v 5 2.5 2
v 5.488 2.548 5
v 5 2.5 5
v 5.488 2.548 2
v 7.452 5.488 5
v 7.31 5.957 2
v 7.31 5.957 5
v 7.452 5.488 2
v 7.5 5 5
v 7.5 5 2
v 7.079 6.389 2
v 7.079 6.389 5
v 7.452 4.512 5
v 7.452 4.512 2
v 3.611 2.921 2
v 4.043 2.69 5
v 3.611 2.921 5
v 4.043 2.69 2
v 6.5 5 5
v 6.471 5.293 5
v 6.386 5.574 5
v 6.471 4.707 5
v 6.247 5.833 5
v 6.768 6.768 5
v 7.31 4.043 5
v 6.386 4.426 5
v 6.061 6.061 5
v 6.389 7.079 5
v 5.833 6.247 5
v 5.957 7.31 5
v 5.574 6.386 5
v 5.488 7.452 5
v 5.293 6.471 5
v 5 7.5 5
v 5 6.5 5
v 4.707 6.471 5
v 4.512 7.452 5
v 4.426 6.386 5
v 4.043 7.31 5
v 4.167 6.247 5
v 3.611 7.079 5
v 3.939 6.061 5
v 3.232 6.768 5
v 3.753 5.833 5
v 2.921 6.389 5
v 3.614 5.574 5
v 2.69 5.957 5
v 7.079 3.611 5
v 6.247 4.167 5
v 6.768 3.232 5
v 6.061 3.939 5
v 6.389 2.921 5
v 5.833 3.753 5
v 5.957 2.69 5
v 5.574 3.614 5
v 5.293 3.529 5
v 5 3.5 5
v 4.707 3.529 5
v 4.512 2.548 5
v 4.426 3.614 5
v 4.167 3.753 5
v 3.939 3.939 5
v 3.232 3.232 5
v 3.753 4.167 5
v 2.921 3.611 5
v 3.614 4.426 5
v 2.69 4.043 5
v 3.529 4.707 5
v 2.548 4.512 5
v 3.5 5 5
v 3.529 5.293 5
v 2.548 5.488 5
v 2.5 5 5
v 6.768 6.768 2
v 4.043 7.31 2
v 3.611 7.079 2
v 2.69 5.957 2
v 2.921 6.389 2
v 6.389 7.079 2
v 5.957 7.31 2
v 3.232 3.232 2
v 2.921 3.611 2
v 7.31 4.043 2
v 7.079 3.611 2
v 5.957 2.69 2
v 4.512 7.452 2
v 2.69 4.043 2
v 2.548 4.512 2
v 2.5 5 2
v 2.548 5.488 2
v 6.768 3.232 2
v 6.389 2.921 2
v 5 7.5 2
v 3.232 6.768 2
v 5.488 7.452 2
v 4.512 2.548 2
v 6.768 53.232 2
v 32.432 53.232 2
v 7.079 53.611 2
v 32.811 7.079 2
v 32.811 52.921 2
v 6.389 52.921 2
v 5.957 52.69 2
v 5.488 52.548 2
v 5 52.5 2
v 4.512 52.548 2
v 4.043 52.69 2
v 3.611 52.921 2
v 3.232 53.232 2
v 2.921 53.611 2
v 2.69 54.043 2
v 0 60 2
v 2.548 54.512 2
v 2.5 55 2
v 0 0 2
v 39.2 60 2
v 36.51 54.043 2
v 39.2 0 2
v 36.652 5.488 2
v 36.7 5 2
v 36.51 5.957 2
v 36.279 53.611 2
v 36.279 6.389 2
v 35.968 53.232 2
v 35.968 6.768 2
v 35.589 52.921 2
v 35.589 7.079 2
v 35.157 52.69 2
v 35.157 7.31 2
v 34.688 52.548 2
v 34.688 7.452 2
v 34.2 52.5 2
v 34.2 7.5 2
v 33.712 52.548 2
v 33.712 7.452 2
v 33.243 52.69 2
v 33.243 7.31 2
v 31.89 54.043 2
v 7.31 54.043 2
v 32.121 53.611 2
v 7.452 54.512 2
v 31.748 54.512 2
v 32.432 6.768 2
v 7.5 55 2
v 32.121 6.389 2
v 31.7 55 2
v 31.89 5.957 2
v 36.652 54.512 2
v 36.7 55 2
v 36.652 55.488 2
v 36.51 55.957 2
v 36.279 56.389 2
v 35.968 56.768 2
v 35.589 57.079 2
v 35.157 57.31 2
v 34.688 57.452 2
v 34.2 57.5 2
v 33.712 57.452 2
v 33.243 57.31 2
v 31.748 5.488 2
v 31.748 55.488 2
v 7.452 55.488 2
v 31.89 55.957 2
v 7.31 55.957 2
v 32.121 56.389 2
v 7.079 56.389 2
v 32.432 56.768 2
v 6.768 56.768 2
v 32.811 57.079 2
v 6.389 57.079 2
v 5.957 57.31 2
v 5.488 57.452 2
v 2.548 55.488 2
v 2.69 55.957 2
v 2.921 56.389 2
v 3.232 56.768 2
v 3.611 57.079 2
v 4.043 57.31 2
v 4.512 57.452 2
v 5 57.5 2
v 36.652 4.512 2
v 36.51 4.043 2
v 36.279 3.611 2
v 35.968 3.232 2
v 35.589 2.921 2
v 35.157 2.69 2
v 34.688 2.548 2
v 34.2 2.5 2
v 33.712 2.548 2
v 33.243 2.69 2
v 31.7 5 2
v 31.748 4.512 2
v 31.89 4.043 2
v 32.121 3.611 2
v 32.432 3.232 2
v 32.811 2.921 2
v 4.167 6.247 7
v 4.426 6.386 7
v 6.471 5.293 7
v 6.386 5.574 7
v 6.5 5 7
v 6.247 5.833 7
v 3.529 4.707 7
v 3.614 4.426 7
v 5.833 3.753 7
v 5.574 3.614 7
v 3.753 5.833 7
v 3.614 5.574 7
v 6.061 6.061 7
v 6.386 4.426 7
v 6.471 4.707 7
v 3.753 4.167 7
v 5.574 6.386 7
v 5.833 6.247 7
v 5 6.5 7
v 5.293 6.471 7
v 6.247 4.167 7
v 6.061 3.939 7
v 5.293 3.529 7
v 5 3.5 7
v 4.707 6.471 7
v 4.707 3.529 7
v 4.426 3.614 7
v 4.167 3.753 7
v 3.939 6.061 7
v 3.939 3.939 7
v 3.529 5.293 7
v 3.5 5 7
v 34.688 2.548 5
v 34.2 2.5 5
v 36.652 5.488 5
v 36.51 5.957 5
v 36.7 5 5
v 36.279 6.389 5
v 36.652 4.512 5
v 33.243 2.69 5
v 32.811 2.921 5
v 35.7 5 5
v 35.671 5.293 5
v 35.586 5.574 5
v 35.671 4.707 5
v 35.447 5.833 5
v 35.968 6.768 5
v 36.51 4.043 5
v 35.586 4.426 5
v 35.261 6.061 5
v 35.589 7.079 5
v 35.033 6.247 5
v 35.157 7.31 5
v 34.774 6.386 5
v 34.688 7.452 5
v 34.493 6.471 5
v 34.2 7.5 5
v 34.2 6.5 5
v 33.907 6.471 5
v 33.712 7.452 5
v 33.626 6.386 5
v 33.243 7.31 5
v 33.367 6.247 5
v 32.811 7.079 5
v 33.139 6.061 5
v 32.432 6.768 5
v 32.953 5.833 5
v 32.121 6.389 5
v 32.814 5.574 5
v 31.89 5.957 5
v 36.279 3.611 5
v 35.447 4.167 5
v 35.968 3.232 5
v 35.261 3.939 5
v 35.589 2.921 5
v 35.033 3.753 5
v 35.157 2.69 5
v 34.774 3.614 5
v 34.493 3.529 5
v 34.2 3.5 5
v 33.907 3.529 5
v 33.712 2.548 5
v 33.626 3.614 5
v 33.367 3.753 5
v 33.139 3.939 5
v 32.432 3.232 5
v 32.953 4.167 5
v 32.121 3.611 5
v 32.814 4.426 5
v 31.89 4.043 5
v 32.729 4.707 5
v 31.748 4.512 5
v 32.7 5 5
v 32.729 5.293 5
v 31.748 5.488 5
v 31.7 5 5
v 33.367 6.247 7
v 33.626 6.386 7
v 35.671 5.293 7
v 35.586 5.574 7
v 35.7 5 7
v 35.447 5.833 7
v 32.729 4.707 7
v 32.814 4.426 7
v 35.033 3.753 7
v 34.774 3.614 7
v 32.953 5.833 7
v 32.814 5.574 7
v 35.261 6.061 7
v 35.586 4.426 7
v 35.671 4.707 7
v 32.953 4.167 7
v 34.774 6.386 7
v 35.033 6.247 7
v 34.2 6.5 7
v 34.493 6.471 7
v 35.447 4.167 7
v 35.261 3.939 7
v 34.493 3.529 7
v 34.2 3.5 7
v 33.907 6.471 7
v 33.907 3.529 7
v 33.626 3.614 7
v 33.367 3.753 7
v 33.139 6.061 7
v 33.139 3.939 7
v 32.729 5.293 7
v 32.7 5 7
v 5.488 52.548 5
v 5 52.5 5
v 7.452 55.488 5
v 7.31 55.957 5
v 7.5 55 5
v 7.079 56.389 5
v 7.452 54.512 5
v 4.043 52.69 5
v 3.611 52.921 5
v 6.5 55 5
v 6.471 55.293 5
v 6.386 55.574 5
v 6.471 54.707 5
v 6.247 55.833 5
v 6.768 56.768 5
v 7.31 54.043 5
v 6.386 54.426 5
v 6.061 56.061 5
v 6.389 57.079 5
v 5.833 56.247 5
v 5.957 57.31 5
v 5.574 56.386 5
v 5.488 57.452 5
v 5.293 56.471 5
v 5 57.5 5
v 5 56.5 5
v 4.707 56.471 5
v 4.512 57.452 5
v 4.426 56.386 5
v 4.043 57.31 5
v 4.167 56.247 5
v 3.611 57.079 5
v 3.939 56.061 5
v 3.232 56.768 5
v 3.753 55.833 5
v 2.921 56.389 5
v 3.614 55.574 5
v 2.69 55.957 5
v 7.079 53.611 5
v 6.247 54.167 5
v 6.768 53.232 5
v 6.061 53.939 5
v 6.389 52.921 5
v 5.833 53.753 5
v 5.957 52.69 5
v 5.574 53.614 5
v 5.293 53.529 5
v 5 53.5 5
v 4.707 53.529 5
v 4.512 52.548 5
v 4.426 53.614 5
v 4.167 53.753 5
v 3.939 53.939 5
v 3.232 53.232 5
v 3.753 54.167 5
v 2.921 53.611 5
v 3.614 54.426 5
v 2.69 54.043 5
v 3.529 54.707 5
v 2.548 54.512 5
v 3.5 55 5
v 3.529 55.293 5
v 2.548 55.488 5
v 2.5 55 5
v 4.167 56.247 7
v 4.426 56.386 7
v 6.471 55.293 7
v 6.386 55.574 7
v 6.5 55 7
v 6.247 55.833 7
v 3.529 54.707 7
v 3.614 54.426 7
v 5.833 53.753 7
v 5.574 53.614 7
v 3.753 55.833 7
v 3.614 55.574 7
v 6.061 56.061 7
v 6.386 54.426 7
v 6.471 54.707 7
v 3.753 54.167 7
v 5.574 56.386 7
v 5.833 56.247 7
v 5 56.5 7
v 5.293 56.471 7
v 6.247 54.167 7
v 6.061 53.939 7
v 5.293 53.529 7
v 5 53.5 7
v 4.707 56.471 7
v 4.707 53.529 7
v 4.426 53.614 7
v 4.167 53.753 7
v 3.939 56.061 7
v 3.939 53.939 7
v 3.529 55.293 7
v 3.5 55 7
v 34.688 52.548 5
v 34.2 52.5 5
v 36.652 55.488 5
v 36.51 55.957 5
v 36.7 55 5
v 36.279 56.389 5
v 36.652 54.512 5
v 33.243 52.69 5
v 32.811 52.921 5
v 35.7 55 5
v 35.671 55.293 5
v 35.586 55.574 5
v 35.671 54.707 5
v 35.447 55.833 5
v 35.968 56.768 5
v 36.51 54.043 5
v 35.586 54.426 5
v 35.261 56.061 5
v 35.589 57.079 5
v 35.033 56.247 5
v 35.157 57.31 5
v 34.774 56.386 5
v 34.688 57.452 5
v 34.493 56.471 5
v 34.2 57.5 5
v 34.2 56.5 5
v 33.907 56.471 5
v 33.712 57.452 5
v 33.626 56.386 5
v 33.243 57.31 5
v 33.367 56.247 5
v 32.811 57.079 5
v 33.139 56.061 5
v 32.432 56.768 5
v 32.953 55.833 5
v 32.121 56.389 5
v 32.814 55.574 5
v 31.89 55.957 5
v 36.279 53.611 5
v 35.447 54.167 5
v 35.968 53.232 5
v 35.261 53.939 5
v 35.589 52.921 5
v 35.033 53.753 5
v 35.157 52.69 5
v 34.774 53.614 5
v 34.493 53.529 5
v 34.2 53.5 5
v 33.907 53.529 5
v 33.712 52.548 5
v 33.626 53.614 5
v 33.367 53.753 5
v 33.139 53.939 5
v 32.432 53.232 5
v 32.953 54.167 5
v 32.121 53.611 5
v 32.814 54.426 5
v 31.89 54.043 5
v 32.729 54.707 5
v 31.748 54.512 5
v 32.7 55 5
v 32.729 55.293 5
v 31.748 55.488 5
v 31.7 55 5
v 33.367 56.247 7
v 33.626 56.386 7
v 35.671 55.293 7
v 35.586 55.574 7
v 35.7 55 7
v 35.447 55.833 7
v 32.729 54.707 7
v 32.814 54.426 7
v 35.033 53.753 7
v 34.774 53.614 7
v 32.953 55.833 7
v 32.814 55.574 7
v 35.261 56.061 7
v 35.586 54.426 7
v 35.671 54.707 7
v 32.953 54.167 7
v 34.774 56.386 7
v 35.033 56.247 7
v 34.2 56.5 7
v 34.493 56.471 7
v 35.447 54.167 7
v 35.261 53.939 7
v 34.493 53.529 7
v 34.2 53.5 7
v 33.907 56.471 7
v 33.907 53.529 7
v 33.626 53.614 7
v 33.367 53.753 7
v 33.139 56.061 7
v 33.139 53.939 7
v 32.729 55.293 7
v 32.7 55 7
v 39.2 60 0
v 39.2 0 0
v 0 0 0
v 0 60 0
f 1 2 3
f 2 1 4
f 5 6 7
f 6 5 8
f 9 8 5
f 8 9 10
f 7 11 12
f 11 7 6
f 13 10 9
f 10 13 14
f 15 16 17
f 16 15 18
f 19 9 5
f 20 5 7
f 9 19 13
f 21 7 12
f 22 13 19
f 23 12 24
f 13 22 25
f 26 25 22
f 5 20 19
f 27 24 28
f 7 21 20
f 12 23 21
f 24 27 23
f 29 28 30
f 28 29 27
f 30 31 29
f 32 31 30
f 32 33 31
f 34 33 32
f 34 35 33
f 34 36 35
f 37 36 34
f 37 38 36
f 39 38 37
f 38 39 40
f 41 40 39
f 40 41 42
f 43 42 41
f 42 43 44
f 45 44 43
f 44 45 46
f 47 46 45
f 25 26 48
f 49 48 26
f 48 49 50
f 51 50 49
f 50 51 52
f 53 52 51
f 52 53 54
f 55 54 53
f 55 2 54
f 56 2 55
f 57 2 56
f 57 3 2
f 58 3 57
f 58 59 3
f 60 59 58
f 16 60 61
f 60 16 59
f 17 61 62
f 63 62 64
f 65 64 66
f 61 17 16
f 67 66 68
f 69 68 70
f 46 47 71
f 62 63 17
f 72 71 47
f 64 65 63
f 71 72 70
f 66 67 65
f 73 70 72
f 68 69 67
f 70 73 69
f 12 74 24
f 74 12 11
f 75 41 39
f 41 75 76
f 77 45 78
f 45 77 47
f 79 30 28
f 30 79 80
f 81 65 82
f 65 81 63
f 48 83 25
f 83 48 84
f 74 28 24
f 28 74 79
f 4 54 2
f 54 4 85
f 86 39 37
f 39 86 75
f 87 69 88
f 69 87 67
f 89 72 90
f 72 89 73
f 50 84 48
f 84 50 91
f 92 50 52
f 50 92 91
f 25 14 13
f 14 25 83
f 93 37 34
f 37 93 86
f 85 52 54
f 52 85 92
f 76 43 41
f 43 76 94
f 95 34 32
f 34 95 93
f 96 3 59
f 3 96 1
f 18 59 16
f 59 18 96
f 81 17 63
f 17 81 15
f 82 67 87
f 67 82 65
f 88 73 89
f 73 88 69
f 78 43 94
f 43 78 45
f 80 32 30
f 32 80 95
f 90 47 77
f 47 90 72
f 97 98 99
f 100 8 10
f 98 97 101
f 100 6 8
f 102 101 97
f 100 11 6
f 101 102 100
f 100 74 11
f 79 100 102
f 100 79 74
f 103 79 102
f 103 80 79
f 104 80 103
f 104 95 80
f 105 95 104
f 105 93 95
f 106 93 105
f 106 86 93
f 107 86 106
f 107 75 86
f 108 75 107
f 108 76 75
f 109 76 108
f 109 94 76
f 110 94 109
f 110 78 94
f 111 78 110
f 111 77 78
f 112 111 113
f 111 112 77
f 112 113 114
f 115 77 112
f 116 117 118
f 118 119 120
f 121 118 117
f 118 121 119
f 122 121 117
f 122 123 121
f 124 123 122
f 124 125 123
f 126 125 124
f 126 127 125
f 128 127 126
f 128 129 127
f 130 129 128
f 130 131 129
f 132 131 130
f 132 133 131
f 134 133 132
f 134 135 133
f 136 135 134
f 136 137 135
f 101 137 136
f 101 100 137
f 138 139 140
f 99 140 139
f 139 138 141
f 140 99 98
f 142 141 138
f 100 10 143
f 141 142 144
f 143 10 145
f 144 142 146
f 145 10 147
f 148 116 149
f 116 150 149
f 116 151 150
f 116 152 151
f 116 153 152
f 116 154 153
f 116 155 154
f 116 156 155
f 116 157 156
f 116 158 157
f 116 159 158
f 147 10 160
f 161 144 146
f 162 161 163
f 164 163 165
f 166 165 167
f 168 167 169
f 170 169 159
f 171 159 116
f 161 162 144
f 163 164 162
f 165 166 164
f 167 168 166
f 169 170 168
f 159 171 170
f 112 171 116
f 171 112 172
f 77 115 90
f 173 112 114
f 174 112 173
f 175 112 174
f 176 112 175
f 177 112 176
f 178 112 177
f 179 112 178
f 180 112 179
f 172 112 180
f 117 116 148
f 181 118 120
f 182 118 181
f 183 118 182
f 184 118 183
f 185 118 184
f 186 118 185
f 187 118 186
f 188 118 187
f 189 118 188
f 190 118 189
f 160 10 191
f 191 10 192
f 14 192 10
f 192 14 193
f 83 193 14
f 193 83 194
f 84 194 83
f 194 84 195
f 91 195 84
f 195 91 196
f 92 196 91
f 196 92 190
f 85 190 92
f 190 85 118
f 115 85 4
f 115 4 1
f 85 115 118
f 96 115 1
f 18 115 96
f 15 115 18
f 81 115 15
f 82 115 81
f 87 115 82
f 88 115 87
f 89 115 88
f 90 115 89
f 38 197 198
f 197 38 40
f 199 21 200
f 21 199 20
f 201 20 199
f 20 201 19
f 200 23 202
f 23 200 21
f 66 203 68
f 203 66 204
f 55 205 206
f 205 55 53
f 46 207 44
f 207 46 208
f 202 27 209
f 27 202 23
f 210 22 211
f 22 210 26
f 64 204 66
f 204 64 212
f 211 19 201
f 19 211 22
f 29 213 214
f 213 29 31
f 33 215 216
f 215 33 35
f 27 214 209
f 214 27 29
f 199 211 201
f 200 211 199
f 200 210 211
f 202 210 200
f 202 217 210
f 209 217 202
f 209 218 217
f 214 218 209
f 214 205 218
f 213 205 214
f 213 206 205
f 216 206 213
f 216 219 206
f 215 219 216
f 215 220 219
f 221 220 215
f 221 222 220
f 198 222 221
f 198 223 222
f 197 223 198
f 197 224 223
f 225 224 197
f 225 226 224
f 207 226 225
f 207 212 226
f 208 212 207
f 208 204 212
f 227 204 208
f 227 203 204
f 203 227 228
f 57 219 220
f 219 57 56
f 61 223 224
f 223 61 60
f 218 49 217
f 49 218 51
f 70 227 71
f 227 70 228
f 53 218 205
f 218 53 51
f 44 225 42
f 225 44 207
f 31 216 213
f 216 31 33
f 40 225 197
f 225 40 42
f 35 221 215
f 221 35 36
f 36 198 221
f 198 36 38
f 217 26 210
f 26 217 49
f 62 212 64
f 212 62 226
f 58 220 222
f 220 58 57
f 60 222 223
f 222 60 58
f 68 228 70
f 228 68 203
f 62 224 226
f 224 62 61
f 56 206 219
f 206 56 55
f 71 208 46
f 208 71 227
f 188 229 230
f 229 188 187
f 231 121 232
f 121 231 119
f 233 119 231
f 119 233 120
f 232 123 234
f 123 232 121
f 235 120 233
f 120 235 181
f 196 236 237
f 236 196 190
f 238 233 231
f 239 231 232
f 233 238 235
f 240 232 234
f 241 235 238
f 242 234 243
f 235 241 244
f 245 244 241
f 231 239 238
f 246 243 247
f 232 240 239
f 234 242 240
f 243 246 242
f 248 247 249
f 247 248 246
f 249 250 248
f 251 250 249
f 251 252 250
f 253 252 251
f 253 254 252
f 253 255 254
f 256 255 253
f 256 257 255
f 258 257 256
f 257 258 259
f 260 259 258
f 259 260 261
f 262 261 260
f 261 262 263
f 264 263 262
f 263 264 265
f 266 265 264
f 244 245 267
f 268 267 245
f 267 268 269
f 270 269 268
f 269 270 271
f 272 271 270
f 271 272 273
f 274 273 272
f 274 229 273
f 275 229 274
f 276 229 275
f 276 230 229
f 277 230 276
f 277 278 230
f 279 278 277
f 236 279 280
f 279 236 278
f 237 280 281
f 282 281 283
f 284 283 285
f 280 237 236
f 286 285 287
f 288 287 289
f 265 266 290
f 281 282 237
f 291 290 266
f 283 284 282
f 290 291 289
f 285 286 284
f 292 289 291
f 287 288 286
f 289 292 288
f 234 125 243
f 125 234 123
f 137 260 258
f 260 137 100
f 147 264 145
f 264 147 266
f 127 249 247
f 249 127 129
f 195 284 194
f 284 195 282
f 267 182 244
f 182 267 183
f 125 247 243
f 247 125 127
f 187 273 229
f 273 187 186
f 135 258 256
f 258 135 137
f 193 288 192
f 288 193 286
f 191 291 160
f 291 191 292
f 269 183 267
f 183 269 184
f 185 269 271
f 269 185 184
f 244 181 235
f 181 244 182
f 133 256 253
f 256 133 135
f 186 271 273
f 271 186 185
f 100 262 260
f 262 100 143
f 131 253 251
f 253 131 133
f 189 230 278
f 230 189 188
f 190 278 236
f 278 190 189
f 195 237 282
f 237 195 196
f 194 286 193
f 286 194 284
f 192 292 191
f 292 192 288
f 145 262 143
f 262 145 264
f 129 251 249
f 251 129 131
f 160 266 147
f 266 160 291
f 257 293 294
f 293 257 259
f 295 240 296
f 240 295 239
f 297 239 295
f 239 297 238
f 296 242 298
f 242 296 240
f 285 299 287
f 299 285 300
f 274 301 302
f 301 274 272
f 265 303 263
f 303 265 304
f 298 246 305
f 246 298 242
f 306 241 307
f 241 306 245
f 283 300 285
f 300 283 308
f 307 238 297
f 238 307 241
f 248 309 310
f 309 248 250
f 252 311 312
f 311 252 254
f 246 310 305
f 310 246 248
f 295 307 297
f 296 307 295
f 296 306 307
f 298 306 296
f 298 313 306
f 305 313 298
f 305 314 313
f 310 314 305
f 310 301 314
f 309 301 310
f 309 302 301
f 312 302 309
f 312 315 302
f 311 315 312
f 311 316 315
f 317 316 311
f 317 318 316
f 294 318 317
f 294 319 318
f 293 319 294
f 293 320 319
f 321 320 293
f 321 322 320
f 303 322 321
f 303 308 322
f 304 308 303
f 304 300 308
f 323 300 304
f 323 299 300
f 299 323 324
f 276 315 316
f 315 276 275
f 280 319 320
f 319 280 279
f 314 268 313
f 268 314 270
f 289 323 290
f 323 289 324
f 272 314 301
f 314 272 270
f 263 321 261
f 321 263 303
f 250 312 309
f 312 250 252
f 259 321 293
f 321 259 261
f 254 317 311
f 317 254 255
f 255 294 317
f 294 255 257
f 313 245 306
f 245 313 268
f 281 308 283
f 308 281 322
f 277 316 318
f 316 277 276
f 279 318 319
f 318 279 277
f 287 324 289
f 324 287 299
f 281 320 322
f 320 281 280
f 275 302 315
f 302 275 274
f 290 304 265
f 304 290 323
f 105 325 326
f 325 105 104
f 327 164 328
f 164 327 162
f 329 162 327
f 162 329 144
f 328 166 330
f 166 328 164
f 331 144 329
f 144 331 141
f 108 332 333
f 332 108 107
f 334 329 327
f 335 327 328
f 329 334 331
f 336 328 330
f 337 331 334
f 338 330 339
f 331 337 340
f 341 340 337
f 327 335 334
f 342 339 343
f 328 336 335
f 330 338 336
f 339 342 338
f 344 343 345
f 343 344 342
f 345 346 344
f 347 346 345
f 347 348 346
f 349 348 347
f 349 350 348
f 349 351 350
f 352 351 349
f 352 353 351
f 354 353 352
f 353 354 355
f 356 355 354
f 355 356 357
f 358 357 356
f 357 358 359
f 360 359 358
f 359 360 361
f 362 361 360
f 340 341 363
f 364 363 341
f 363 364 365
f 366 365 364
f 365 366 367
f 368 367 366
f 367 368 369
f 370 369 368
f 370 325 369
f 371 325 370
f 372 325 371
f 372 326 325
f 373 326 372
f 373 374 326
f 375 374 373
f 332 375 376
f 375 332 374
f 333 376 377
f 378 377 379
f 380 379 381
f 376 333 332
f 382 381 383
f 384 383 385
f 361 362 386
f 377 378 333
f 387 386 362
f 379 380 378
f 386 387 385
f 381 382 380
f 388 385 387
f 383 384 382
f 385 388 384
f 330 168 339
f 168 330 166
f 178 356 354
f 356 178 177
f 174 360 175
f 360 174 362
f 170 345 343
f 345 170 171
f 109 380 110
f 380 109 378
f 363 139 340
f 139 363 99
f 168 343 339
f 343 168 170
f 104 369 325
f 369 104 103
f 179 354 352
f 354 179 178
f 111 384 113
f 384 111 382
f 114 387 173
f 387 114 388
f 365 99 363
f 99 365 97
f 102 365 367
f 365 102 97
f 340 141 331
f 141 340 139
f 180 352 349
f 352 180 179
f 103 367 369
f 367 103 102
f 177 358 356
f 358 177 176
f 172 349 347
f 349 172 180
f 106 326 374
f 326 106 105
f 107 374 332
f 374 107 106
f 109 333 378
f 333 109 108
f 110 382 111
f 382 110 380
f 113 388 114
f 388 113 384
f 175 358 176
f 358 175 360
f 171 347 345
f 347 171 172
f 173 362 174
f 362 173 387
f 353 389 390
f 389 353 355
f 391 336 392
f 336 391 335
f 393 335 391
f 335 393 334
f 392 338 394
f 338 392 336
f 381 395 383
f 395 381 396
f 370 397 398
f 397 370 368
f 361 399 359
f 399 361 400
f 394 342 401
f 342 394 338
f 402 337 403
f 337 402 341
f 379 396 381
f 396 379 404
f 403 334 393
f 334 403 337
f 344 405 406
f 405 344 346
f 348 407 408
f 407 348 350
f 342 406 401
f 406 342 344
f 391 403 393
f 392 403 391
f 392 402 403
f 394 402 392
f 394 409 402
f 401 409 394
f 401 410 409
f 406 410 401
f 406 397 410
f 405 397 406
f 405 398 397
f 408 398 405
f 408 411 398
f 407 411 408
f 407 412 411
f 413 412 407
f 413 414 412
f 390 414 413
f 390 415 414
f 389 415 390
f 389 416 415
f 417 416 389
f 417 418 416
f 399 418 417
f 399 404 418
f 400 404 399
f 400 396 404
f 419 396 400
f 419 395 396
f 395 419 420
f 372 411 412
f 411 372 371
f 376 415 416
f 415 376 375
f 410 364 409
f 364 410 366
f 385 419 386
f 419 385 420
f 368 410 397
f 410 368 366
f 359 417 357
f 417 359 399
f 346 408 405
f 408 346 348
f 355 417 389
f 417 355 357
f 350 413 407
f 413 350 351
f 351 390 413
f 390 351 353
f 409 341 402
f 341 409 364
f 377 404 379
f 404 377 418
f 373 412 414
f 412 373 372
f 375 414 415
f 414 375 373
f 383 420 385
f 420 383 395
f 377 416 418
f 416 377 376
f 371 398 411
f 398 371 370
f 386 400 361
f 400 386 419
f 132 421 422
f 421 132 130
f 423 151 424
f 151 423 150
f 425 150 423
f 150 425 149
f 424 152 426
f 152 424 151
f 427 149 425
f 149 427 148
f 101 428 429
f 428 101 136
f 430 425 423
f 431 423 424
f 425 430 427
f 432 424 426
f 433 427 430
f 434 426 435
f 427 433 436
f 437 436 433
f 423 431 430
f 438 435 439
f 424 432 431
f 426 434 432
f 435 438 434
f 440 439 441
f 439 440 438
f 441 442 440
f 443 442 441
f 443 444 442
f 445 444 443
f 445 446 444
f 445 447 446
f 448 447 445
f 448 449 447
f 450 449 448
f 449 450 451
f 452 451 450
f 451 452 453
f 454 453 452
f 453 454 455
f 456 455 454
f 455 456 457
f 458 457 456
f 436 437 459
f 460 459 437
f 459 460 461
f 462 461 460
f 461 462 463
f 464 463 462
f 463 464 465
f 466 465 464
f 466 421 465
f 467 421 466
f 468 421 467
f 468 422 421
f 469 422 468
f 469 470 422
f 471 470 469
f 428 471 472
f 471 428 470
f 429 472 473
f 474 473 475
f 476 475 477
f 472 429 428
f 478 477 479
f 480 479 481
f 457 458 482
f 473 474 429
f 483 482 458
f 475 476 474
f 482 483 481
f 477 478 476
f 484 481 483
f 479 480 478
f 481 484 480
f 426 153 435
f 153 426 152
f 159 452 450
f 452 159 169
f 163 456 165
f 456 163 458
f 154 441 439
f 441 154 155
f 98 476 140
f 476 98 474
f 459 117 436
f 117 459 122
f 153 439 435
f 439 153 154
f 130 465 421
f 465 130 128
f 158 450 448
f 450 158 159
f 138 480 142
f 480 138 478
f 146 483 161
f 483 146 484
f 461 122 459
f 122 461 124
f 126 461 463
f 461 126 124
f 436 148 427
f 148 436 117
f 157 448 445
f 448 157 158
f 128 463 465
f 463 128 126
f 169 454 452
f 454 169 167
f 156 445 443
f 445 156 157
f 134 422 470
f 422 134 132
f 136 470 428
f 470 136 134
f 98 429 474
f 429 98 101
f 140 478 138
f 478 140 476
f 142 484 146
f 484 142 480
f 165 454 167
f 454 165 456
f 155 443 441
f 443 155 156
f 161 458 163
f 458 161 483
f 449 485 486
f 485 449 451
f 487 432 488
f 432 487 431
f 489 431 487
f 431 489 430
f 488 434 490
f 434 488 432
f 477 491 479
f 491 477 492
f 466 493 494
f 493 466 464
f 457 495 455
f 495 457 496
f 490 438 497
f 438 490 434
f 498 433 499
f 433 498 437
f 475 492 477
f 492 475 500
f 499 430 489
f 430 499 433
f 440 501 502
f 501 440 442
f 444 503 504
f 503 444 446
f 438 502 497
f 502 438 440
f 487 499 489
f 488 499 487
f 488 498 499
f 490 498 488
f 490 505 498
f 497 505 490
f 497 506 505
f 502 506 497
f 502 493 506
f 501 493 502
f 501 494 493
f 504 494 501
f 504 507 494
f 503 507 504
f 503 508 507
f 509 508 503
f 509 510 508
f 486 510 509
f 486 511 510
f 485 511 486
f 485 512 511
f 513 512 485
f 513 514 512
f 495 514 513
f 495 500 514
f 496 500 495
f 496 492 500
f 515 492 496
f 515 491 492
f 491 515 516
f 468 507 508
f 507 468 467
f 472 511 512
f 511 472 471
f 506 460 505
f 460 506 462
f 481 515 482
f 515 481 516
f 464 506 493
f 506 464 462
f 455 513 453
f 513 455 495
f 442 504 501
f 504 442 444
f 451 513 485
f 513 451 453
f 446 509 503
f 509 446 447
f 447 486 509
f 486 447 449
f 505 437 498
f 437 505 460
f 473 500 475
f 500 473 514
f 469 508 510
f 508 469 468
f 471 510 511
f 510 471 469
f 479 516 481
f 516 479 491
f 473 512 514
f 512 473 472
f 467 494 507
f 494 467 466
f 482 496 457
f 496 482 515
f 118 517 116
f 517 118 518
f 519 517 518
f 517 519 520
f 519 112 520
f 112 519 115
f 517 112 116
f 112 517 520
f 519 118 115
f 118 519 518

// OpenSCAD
// base dimensions
width=39.2;
height=60;
thickness=2;

module plate_holder(){
    cylinder(h=3, d=5, $fn=32);
    translate([0,0,3]) cylinder(h=2, d=3, $fn=32);
}


cube([width,height,thickness]);

translate([5,5,thickness]) plate_holder();
translate([width-5,5,thickness]) plate_holder();
translate([5,height-5,thickness]) plate_holder();
translate([width-5,height-5,thickness]) plate_holder();
